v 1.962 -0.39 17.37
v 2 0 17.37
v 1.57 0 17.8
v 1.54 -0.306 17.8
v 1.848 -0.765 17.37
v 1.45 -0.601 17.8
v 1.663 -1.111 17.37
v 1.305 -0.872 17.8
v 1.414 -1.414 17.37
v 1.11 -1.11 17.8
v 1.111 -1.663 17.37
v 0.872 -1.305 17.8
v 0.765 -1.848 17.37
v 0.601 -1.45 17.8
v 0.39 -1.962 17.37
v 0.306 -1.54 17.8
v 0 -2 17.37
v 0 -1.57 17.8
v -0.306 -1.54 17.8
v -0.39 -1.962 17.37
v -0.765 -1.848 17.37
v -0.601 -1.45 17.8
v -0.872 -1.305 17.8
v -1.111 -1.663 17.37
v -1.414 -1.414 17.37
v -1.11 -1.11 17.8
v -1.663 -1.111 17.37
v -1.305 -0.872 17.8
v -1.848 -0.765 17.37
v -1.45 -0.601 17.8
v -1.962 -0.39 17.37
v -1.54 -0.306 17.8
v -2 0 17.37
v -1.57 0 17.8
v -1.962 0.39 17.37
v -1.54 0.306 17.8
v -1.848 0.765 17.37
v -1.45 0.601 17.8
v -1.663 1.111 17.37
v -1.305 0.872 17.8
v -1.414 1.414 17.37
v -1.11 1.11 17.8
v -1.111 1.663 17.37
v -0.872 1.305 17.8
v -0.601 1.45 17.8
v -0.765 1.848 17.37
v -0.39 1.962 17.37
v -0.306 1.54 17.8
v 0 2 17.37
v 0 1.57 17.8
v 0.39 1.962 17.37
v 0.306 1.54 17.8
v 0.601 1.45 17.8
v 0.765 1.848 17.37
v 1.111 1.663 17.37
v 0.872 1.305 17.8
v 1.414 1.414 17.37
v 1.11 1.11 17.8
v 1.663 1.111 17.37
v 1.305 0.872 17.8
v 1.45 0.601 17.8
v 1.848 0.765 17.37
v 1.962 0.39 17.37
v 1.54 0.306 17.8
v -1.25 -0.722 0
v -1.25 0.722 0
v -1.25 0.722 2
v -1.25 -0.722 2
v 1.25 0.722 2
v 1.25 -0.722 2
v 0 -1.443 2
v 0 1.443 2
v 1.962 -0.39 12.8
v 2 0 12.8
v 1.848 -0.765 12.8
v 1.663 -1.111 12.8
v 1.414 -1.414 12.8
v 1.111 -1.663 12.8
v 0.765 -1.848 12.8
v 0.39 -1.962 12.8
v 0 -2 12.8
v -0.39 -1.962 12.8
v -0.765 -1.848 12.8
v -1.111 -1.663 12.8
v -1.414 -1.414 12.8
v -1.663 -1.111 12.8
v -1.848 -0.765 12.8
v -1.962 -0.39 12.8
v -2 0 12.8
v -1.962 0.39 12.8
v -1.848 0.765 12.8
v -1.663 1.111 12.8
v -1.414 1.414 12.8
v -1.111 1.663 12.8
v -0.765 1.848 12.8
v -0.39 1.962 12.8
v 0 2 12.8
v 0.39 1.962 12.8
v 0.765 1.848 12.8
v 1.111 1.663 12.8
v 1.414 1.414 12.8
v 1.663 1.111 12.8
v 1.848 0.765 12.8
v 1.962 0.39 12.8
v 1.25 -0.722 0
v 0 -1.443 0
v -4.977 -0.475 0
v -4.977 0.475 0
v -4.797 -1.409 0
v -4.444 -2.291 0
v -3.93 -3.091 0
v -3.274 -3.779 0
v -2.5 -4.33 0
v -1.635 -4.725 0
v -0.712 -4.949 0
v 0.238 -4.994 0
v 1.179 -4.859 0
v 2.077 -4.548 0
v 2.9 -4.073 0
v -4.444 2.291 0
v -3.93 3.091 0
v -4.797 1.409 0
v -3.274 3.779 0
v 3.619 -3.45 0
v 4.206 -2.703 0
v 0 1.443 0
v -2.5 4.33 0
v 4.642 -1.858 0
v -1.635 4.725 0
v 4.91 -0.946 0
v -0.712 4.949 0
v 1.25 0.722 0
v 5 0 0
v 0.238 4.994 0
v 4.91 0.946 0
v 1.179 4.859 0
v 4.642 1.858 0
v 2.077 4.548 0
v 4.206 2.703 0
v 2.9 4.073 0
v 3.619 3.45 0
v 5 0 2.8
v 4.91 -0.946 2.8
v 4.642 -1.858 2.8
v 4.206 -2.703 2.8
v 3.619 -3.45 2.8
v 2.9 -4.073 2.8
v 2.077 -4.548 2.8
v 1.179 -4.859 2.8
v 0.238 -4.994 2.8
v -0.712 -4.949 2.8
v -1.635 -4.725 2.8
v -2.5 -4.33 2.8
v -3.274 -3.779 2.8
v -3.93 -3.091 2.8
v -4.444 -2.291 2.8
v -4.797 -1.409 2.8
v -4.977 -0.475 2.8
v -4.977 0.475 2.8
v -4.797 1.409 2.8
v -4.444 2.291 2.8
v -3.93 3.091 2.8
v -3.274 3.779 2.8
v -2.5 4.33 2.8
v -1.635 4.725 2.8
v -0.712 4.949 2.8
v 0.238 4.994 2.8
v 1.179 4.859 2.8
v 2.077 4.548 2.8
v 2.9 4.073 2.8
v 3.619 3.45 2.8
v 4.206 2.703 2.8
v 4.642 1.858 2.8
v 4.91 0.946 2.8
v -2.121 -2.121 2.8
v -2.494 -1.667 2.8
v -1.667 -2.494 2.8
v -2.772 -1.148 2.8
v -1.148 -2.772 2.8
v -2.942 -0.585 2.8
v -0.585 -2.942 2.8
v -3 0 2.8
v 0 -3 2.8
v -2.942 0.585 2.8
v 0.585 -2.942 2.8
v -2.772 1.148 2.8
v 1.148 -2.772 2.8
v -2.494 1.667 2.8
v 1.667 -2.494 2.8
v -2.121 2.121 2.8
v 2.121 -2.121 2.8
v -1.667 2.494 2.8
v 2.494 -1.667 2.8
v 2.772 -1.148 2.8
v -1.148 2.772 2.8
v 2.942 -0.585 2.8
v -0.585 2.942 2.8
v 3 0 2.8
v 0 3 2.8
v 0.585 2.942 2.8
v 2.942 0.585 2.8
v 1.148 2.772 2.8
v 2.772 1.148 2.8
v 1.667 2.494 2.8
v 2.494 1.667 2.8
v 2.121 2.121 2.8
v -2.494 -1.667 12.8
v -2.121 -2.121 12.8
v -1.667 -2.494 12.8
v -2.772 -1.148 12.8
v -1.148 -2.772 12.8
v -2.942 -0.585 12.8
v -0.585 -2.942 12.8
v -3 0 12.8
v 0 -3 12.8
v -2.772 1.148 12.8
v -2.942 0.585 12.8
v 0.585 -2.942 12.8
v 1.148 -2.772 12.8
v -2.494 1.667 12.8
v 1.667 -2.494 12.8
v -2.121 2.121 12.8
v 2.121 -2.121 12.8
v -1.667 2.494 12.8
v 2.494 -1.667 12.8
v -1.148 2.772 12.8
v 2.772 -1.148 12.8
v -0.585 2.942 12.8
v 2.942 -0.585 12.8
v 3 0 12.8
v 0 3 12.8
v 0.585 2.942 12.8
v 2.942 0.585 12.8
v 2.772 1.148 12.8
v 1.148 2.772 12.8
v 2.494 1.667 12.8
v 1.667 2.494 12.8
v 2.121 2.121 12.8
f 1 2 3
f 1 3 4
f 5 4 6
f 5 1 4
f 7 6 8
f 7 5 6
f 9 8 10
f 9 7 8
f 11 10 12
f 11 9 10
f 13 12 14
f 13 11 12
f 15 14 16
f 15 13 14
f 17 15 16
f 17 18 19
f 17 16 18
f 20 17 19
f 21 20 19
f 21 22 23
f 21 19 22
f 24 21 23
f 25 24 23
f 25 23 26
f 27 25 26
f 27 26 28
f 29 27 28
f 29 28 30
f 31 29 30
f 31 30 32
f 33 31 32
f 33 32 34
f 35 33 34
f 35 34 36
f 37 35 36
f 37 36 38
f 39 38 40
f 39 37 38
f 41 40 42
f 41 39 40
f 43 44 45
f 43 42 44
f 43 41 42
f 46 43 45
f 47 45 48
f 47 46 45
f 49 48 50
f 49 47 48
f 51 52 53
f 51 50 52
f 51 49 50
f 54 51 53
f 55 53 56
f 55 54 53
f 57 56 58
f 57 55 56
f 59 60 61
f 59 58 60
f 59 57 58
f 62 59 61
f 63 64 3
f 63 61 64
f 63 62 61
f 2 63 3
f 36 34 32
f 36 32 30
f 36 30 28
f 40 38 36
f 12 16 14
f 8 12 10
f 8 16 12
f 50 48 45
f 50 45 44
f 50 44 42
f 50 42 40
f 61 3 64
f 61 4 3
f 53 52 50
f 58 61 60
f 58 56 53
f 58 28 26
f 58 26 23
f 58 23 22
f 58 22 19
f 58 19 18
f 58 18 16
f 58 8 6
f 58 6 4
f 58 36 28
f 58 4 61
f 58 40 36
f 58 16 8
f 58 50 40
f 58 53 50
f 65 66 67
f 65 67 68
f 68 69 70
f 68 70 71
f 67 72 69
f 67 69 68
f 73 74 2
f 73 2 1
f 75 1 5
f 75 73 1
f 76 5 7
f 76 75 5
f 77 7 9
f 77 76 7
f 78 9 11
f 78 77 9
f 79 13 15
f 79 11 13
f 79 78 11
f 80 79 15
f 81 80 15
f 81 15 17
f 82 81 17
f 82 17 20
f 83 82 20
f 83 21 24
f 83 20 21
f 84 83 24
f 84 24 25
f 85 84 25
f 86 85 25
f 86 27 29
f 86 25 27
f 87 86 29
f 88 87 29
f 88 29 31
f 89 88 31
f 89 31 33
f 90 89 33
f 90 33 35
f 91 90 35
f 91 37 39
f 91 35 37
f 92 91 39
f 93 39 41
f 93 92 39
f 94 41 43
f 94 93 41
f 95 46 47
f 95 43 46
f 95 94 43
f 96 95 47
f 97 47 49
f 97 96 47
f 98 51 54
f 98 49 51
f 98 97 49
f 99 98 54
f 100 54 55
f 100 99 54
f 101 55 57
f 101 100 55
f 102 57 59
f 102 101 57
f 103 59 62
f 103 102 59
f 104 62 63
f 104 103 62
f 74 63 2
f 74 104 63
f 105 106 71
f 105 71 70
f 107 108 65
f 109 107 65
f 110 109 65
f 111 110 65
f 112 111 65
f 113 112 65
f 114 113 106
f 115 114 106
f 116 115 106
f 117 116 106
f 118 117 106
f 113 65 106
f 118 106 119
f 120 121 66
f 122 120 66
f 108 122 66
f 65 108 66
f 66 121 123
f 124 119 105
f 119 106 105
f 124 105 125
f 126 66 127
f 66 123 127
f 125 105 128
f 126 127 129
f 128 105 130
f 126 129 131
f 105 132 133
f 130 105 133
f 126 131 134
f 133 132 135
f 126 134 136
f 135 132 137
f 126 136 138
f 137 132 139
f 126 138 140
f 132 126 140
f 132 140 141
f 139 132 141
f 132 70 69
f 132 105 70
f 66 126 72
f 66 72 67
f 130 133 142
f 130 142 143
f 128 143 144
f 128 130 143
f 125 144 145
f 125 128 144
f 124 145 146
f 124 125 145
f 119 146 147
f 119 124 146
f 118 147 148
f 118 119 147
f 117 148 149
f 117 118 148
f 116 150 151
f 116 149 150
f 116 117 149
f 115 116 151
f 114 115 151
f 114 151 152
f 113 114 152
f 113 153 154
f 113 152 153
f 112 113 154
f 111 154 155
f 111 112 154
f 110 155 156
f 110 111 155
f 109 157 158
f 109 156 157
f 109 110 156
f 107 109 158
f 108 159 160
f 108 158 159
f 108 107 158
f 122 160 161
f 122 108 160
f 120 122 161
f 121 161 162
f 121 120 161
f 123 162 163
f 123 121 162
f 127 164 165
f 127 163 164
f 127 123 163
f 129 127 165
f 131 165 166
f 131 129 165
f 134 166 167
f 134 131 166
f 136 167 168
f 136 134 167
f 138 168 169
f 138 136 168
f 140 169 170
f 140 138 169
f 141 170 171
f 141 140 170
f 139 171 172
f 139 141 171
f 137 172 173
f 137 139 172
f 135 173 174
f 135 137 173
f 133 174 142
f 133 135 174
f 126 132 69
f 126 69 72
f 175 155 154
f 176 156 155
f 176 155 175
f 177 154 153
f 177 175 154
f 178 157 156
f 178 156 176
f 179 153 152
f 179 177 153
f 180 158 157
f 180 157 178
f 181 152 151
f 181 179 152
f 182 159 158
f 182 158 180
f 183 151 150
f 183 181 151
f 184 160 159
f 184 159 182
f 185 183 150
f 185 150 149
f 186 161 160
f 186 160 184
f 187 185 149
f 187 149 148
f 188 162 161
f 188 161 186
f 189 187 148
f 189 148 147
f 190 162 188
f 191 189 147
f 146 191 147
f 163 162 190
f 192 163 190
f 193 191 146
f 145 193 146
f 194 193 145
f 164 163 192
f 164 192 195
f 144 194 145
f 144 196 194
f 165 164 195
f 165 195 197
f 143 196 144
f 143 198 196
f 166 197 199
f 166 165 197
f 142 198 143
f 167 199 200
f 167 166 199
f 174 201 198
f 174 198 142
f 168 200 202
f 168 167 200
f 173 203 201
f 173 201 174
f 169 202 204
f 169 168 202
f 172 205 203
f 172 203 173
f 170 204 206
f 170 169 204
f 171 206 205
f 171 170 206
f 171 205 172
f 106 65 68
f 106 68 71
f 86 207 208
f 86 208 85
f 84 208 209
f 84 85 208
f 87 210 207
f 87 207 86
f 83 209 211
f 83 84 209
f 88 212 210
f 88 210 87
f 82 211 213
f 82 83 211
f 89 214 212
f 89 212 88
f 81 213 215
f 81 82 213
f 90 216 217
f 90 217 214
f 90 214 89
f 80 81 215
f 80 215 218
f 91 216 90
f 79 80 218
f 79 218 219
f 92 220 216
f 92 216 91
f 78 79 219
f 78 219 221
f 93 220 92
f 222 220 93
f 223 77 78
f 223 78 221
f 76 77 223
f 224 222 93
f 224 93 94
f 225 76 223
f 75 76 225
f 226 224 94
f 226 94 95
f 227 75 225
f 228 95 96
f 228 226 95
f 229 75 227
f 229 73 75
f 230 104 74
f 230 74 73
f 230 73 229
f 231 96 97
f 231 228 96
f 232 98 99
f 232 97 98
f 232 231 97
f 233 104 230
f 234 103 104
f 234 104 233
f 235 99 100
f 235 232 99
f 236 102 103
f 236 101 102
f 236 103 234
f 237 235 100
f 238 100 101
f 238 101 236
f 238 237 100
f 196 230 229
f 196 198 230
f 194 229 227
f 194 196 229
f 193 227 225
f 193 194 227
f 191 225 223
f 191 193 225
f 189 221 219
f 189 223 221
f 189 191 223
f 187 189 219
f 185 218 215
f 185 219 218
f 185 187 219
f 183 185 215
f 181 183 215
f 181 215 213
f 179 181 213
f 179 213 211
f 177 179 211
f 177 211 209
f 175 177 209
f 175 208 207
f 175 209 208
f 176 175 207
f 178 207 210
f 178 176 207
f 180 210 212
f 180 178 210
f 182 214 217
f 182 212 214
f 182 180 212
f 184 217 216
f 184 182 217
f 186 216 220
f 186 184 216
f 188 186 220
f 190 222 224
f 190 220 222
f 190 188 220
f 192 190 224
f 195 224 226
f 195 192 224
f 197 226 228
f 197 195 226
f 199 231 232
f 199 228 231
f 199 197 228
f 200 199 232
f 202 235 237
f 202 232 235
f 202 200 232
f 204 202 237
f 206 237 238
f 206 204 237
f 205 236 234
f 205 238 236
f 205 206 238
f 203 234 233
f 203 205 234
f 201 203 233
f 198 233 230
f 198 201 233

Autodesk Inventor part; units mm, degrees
ref_plane "YZ Plane" through (0, 0, 0) normal (1, 0, 0) x (0, 1, 0)
ref_plane "XZ Plane" through (0, 0, 0) normal (0, 1, 0) x (-1, 0, 0)
ref_plane "XY Plane" through (0, 0, 0) normal (0, 0, 1) x (1, 0, 0)
sketch "Sketch1" plane through (0, 0, 0) normal (0, 1, 0) x (-1, 0, 0)
  line L0 (0, 0) -> (0, 17.8)
  line L1 (0, 17.8) -> (-2, 17.8)
  line L2 (-2, 17.8) -> (-2, 12.8)
  line L3 (-2, 12.8) -> (-3, 12.8)
  line L4 (-3, 12.8) -> (-3, 2.8)
  line L5 (-3, 2.8) -> (-5, 2.8)
  line L6 (-5, 2.8) -> (-5, 0)
  line L7 (-5, 0) -> (0, 0)
  dimension "d0" = 10
  dimension "d1" = 6
  dimension "d2" = 4
  dimension "d3" = 5
  dimension "d4" = 10
  dimension "d5" = 2.8
revolve "Revolution1" add sketch "Sketch1" angle 360 about axis through (0, 0, 0) along (0, 0, 1)
thread "Thread1" size "M4x0.7" class "6g" standard "ANSI Metric M Profile" length 6 offset 1.2
sketch "Sketch2" plane through (0, 0, 0) normal (0, 0, -1) x (-1, 0, 0)
  line L0 (0, 1.4434) -> (1.25, 0.7217)
  line L1 (1.25, 0.7217) -> (1.25, -0.7217)
  line L2 (1.25, -0.7217) -> (0, -1.4434)
  line L3 (0, -1.4434) -> (-1.25, -0.7217)
  line L4 (-1.25, -0.7217) -> (-1.25, 0.7217)
  line L5 (-1.25, 0.7217) -> (0, 1.4434)
  point P0 (0, 0)
  point P1 (0, 0)
  dimension "d9" = 2.5
extrude "Extrusion1" cut sketch "Sketch2" against normal blind 2
chamfer "Chamfer1" distance 0.43 angle 45 1 edges at (-2, 0, 17.8)
properties part number "DBTSY4-10-5-DHC" material "Stainless Steel AISI 304"
